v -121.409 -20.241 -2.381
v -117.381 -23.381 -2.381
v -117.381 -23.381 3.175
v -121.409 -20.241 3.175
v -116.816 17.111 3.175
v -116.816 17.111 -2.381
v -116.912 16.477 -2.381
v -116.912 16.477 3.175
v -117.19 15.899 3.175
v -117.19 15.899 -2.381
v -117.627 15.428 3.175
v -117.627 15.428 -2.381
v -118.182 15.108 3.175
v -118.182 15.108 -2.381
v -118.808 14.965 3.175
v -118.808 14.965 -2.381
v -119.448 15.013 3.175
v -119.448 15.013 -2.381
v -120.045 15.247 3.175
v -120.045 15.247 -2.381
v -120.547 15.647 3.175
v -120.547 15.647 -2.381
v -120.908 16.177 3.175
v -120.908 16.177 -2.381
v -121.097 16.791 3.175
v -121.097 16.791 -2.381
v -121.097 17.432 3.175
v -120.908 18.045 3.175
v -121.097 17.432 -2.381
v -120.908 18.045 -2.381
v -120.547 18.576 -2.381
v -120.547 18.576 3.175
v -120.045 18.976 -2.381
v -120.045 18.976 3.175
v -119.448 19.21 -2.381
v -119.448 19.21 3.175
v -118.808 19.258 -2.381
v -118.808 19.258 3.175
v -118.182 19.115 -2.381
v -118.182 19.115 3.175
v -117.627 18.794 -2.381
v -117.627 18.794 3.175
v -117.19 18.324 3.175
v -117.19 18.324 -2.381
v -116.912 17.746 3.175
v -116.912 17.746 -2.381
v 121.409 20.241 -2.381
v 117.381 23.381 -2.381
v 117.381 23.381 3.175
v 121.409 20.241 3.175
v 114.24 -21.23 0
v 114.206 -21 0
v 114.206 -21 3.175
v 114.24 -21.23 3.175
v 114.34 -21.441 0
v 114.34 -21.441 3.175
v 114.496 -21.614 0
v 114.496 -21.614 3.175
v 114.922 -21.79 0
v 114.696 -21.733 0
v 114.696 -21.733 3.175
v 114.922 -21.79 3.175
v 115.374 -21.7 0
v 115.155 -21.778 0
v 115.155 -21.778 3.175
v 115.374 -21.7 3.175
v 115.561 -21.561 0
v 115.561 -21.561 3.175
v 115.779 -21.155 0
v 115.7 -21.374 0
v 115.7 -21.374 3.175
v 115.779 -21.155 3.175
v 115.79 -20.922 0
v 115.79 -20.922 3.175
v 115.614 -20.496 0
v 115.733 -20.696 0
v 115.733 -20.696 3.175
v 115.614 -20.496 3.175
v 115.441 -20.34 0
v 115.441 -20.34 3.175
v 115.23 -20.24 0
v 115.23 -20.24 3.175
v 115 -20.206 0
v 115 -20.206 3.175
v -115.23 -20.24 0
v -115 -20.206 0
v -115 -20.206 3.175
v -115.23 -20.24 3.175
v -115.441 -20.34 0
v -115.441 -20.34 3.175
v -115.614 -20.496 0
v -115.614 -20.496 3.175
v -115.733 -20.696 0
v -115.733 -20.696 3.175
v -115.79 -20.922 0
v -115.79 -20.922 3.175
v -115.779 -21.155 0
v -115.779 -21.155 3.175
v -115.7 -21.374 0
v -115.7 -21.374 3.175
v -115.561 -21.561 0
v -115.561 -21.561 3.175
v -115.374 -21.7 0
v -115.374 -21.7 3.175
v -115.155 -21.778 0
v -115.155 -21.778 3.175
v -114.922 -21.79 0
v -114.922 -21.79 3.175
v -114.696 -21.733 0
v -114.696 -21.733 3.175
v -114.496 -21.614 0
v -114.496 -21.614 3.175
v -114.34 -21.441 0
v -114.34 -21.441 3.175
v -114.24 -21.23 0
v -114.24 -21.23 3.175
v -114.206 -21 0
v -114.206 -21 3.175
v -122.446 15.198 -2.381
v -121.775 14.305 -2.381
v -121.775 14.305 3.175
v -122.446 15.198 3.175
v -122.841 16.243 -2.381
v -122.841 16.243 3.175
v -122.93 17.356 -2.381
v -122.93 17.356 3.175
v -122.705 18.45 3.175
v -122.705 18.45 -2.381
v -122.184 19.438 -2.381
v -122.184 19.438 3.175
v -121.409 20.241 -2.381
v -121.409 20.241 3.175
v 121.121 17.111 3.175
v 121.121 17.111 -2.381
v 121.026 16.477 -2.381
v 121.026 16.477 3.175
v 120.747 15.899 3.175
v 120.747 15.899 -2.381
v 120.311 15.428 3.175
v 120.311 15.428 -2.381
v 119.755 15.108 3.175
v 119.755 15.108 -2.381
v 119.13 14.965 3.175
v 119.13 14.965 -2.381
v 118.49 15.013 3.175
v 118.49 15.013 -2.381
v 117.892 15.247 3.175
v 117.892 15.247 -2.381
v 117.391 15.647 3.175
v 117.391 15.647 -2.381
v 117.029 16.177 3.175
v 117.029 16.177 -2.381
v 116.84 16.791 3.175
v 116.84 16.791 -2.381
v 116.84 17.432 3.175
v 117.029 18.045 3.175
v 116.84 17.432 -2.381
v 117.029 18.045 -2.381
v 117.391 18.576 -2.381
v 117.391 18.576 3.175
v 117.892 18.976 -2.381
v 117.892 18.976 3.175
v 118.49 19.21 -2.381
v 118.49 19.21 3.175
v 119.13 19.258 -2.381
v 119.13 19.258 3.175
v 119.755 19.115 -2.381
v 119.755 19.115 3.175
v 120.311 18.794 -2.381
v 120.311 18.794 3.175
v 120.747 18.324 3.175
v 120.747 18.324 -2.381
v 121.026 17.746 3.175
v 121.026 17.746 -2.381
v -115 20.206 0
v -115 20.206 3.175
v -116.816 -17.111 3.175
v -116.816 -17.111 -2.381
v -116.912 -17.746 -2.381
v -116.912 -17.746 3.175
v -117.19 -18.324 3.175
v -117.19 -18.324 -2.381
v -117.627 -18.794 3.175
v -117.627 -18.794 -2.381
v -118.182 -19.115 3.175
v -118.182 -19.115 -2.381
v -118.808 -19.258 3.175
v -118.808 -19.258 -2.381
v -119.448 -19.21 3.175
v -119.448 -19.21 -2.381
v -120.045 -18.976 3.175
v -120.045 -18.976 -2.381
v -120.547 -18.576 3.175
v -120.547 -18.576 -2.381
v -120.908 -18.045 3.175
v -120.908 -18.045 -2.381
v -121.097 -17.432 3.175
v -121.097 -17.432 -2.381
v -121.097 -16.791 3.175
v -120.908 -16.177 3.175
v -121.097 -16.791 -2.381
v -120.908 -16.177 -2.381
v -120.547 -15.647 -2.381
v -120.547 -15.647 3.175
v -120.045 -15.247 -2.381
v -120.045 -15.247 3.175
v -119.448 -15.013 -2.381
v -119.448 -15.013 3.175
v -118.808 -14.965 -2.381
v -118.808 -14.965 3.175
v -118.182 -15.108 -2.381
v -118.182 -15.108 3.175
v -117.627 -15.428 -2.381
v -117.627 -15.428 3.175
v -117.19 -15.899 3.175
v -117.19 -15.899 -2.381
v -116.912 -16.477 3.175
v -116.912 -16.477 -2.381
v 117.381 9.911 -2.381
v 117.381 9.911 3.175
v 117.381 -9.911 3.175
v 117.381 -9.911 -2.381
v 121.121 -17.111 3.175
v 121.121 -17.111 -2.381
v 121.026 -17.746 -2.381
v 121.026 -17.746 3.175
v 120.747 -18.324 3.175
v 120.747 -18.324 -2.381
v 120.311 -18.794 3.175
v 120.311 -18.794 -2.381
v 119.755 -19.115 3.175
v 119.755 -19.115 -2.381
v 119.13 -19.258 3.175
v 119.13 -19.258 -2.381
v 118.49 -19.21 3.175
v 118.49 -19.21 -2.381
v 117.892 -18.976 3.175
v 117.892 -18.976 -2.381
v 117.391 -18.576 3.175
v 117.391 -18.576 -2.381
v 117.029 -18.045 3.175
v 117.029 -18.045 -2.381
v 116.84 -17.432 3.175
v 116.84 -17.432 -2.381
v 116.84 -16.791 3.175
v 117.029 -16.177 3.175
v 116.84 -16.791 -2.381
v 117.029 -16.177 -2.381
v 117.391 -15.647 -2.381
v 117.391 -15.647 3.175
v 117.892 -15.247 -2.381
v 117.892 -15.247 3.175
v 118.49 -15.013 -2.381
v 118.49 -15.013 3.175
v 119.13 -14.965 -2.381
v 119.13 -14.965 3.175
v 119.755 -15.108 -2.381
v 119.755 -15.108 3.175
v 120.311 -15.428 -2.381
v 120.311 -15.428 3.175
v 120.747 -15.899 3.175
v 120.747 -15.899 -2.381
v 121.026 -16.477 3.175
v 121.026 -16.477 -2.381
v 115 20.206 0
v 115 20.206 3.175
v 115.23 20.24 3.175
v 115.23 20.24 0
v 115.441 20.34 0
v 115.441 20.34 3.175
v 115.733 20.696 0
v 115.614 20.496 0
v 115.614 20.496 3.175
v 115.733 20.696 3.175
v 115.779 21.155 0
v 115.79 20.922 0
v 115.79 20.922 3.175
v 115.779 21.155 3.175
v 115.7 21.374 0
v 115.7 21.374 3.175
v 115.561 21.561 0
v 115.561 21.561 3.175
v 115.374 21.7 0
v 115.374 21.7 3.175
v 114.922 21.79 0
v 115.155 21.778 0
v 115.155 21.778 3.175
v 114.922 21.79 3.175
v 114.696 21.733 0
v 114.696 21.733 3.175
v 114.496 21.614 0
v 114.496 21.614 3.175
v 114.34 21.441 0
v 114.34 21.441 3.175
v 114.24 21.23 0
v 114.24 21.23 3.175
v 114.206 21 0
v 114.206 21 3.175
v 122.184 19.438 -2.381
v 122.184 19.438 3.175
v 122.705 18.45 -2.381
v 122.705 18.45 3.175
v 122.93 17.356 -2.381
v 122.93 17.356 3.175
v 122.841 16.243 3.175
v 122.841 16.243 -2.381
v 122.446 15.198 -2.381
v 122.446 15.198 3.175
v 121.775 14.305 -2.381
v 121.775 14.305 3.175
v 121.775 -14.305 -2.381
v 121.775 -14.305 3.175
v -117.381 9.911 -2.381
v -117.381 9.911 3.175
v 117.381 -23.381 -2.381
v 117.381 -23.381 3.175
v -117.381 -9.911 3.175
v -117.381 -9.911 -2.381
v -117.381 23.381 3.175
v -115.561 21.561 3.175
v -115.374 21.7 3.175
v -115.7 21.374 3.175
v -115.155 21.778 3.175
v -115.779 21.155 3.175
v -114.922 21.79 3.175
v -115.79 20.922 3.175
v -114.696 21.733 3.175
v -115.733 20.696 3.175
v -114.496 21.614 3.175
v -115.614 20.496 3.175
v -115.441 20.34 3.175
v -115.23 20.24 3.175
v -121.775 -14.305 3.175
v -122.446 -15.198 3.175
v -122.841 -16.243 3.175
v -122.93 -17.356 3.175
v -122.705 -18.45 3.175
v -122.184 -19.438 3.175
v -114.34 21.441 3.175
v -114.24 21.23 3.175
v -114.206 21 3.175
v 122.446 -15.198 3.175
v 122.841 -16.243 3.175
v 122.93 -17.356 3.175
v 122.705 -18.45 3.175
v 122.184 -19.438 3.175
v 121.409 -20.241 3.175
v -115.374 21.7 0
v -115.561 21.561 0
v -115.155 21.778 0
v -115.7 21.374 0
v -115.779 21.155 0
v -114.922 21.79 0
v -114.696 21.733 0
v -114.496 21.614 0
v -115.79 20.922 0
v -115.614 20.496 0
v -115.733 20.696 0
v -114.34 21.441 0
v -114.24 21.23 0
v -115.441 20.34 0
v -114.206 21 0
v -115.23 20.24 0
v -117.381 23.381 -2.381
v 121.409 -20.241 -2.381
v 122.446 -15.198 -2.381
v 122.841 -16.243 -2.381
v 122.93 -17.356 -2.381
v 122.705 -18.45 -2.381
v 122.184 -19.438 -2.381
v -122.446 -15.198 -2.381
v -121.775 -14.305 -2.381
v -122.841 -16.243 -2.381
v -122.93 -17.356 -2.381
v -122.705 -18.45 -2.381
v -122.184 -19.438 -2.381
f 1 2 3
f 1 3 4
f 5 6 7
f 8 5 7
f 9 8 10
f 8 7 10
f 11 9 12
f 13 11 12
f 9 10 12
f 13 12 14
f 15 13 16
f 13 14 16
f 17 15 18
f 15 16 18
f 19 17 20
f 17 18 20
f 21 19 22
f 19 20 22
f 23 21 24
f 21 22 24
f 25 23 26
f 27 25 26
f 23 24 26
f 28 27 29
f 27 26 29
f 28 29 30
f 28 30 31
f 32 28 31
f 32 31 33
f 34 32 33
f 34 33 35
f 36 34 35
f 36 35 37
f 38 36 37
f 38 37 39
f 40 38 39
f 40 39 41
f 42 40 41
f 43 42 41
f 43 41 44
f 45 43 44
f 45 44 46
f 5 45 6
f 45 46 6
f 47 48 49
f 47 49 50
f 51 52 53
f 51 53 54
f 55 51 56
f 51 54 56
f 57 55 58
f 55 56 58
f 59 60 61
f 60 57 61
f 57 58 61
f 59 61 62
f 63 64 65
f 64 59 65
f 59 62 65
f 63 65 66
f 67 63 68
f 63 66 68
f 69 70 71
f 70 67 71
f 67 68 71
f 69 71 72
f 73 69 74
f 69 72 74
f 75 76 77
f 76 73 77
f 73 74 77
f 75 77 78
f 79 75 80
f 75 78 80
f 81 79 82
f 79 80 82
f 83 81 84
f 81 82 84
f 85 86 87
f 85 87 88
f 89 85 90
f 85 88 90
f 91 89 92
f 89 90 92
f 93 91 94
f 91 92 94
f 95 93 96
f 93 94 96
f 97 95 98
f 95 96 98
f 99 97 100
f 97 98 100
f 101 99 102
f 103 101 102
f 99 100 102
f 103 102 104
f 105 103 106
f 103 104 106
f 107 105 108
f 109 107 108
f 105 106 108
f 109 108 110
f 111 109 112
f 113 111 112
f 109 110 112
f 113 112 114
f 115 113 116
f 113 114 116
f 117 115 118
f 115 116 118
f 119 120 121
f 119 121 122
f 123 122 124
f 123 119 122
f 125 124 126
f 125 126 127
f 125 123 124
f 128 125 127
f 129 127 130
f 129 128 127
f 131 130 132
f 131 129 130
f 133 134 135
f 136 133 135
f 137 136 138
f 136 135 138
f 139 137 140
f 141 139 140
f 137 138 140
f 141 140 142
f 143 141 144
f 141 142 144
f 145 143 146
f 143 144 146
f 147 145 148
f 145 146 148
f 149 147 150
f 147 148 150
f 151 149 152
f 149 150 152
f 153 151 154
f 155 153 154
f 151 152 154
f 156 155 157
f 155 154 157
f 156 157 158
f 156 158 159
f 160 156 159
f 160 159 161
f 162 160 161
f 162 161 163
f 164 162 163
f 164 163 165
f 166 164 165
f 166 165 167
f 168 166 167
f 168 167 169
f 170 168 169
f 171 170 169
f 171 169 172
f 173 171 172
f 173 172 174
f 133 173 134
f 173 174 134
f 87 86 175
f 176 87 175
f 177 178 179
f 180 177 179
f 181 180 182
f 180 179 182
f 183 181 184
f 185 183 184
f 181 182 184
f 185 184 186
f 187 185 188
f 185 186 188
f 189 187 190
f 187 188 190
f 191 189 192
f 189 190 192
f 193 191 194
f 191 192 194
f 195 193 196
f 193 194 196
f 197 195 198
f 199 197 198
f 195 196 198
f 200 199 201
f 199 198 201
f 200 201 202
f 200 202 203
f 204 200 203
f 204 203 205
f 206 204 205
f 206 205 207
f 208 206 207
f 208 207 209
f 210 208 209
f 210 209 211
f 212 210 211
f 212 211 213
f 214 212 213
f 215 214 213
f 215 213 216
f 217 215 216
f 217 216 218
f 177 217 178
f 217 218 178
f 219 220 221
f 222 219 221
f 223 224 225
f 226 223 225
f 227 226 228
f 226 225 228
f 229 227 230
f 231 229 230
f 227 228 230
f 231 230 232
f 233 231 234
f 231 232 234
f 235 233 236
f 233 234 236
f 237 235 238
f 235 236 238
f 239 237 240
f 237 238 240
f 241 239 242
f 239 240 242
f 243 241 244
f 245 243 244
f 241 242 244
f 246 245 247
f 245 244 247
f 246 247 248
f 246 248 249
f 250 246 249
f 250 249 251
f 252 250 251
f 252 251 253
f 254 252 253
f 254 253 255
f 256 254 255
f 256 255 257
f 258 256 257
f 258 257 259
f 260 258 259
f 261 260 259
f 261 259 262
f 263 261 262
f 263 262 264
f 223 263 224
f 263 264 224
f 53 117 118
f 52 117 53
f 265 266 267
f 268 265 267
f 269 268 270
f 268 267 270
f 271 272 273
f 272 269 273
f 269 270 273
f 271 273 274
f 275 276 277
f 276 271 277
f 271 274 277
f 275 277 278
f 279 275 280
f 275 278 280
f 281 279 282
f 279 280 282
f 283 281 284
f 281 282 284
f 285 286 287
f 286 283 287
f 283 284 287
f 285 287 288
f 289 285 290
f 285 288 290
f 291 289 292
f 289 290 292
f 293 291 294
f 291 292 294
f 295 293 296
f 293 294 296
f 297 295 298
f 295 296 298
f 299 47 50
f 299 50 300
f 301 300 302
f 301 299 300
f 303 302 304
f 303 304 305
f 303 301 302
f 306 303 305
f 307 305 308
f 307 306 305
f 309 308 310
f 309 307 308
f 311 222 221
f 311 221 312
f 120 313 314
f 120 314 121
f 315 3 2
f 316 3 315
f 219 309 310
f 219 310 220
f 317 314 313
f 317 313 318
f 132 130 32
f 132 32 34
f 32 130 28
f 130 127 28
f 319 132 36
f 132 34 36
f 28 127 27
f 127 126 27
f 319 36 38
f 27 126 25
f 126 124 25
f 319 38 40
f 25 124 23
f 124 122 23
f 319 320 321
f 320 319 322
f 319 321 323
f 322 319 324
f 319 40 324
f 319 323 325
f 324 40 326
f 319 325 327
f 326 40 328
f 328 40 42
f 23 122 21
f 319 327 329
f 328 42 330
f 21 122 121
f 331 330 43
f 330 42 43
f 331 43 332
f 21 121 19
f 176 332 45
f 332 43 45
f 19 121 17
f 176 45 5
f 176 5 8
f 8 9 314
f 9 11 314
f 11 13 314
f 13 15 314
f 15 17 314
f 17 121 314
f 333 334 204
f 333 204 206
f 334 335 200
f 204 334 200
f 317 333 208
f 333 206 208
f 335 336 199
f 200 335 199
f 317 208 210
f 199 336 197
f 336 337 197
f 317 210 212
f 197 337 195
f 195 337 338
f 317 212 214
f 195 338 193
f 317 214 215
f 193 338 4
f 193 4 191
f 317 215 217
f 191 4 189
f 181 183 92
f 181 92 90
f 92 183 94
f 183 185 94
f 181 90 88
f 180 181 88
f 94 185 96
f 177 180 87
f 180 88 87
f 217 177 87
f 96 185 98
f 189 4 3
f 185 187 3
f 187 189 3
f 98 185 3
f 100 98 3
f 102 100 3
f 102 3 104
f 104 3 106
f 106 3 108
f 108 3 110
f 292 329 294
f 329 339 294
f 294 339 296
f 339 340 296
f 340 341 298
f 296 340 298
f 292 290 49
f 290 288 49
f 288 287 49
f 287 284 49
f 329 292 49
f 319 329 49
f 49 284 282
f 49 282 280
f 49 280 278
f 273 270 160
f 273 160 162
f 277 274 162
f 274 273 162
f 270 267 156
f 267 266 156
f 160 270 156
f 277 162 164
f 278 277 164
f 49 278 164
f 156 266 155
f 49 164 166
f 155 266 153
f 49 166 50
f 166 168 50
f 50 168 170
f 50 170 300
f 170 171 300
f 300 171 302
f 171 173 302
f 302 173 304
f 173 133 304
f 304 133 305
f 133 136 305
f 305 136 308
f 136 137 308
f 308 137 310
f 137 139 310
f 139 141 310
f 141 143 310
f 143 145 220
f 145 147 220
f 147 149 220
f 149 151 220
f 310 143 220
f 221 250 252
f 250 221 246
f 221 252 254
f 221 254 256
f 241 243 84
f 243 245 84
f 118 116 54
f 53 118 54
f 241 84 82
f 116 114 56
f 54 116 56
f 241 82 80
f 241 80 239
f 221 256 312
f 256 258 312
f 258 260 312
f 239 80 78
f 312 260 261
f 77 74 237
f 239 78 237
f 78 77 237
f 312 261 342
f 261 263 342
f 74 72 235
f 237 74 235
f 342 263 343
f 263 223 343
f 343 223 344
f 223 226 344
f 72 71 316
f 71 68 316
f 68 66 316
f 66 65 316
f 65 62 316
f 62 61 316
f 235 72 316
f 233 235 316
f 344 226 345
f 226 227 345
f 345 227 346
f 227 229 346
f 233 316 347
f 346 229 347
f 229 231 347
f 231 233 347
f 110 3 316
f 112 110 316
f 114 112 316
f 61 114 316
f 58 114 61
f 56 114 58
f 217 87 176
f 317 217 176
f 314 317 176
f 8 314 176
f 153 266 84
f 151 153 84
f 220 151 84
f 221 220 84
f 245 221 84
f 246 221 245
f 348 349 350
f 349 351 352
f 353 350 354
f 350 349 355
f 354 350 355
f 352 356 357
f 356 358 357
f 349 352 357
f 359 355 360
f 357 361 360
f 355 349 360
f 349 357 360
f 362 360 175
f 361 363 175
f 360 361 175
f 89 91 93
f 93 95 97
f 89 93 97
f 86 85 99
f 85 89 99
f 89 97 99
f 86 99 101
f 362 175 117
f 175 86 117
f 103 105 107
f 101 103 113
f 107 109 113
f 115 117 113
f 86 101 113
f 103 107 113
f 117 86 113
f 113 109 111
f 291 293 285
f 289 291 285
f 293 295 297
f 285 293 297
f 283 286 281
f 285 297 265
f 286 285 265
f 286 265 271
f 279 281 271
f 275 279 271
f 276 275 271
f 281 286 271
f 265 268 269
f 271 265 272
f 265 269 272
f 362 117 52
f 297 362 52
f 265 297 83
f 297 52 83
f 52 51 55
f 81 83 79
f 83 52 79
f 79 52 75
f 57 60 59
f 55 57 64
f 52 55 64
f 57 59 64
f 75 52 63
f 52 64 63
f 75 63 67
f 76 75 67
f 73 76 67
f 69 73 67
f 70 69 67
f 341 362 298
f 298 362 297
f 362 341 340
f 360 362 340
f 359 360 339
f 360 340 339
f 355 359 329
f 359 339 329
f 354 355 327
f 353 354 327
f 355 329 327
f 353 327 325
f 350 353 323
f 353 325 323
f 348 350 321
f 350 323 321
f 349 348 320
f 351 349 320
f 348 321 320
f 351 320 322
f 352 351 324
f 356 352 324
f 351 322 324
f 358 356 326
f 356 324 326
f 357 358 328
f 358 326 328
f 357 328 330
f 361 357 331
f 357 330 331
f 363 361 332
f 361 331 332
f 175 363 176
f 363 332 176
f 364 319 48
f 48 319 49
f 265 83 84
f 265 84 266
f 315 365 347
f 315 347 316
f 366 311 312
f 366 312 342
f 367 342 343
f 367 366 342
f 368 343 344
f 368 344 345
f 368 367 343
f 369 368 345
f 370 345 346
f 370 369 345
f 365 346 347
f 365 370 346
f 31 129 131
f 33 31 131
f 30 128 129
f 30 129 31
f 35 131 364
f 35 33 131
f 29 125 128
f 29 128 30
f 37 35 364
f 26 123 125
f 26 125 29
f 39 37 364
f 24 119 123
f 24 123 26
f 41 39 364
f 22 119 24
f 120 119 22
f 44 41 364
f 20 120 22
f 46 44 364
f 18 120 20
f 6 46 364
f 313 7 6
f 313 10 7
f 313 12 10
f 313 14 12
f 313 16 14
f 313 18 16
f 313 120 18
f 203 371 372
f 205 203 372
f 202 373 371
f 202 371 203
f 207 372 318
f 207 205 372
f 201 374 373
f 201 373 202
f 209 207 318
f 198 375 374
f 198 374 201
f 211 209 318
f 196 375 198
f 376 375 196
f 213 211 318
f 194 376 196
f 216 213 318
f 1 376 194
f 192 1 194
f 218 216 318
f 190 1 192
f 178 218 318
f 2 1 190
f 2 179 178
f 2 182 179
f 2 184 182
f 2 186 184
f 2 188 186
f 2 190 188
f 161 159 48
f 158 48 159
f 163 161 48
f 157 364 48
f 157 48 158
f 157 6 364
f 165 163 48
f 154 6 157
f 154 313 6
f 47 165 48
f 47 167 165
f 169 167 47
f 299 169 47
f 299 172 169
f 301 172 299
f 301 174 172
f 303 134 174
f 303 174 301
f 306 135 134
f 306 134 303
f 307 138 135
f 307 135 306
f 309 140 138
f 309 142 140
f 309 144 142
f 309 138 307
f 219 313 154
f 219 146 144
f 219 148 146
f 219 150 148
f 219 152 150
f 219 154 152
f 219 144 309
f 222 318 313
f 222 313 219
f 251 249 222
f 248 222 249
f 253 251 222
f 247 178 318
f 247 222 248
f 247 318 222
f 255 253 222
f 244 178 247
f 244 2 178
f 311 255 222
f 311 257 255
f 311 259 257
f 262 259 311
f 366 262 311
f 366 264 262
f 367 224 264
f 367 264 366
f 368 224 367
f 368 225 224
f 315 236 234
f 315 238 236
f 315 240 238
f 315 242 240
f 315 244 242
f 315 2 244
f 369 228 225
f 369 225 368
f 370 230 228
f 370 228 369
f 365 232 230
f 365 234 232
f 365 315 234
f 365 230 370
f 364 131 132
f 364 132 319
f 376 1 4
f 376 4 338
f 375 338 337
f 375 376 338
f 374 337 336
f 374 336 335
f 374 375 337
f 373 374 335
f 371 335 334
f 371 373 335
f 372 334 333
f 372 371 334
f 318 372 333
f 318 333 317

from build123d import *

# Parameters (mm, degrees)
F0_W     = 234.762548
F0_H     = 46.762416
F0_W_2   = 230.000048
F0_H_2   = 41.999916
F1_DEPTH = 3.175
F2_W     = 234.762548
F2_H     = 46.762416
F3_DEPTH = 2.38125
F5_DEPTH = 5.55625
F6_R     = 2.15265
F7_DEPTH = 5.55625
F8_R     = 0.79375
F9_DEPTH = 3.175


# Not quite as in the source:
# - a length typed as a fraction of an inch, garbled in the dataset ("3 / 203.2 mm" for 3/8 in), is restored


with BuildPart() as f1:
    # F0 (on Top) → F1 (new body)
    with BuildSketch(Plane.XY):
        Rectangle(F0_W, F0_H)
        Rectangle(F0_W_2, F0_H_2, mode=Mode.SUBTRACT)
    extrude(amount=F1_DEPTH)

    # F2 (on face) → F3 (join)
    with BuildSketch(Plane(origin=(0, 0, 0), x_dir=(1, 0, 0), z_dir=(0, 0, -1))):
        Rectangle(F2_W, F2_H)
    extrude(amount=F3_DEPTH)

    # F4 (on face) → F5 (join, through all)
    with BuildSketch(Plane(origin=(0, 0, -2.38125), x_dir=(1, 0, 0), z_dir=(0, 0, -1))):
        with BuildLine():
            Line((-121.408854552, -20.241406366), (-117.381274, -23.381208))
            Line((-117.381274, -23.381208), (-117.381274, -9.9112329577))
            Line((-117.381274, -9.9112329577), (-121.7751040378, -14.3050629955))
            ThreePointArc((-121.7751040378, -14.3050629955), (-122.9299921425, -17.3557849119), (-121.408854552, -20.241406366))
        make_face()
        with BuildLine():
            Line((-117.381274, 9.9112329577), (-117.381274, 23.381208))
            Line((-117.381274, 23.381208), (-121.408854552, 20.241406366))
            ThreePointArc((-121.408854552, 20.241406366), (-122.9299921425, 17.3557849119), (-121.7751040378, 14.3050629955))
            Line((-121.7751040378, 14.3050629955), (-117.381274, 9.9112329577))
        make_face()
        with BuildLine():
            Line((117.381274, -9.9112329577), (117.381274, -23.381208))
            Line((117.381274, -23.381208), (121.408854552, -20.241406366))
            ThreePointArc((121.408854552, -20.241406366), (122.9299921425, -17.3557849119), (121.7751040378, -14.3050629955))
            Line((121.7751040378, -14.3050629955), (117.381274, -9.9112329577))
        make_face()
        with BuildLine():
            Line((121.408854552, 20.241406366), (117.381274, 23.381208))
            Line((117.381274, 23.381208), (117.381274, 9.9112329577))
            Line((117.381274, 9.9112329577), (121.7751040378, 14.3050629955))
            ThreePointArc((121.7751040378, 14.3050629955), (122.9299921425, 17.3557849119), (121.408854552, 20.241406366))
        make_face()
    extrude(amount=-F5_DEPTH)

    # F6 (on face) → F7 (cut, through all)
    with BuildSketch(Plane(origin=(0, 0, -2.38125), x_dir=(1, 0, 0), z_dir=(0, 0, -1))):
        with Locations((-118.968774, -17.1113930333)):
            Circle(F6_R)
        with Locations((-118.968774, 17.1113930333)):
            Circle(F6_R)
        with Locations((118.968774, 17.1113930333)):
            Circle(F6_R)
        with Locations((118.968774, -17.1113930333)):
            Circle(F6_R)
    extrude(amount=-F7_DEPTH, mode=Mode.SUBTRACT)

    # F8 (on face) → F9 (cut, through all)
    with BuildSketch(Plane.XY.offset(3.175)):
        with Locations((-115.000024, 20.999958)):
            Circle(F8_R)
        with Locations((-115.000024, -20.999958)):
            Circle(F8_R)
        with Locations((115.000024, -20.999958)):
            Circle(F8_R)
        with Locations((115.000024, 20.999958)):
            Circle(F8_R)
    extrude(amount=-F9_DEPTH, mode=Mode.SUBTRACT)


solid = f1.part
